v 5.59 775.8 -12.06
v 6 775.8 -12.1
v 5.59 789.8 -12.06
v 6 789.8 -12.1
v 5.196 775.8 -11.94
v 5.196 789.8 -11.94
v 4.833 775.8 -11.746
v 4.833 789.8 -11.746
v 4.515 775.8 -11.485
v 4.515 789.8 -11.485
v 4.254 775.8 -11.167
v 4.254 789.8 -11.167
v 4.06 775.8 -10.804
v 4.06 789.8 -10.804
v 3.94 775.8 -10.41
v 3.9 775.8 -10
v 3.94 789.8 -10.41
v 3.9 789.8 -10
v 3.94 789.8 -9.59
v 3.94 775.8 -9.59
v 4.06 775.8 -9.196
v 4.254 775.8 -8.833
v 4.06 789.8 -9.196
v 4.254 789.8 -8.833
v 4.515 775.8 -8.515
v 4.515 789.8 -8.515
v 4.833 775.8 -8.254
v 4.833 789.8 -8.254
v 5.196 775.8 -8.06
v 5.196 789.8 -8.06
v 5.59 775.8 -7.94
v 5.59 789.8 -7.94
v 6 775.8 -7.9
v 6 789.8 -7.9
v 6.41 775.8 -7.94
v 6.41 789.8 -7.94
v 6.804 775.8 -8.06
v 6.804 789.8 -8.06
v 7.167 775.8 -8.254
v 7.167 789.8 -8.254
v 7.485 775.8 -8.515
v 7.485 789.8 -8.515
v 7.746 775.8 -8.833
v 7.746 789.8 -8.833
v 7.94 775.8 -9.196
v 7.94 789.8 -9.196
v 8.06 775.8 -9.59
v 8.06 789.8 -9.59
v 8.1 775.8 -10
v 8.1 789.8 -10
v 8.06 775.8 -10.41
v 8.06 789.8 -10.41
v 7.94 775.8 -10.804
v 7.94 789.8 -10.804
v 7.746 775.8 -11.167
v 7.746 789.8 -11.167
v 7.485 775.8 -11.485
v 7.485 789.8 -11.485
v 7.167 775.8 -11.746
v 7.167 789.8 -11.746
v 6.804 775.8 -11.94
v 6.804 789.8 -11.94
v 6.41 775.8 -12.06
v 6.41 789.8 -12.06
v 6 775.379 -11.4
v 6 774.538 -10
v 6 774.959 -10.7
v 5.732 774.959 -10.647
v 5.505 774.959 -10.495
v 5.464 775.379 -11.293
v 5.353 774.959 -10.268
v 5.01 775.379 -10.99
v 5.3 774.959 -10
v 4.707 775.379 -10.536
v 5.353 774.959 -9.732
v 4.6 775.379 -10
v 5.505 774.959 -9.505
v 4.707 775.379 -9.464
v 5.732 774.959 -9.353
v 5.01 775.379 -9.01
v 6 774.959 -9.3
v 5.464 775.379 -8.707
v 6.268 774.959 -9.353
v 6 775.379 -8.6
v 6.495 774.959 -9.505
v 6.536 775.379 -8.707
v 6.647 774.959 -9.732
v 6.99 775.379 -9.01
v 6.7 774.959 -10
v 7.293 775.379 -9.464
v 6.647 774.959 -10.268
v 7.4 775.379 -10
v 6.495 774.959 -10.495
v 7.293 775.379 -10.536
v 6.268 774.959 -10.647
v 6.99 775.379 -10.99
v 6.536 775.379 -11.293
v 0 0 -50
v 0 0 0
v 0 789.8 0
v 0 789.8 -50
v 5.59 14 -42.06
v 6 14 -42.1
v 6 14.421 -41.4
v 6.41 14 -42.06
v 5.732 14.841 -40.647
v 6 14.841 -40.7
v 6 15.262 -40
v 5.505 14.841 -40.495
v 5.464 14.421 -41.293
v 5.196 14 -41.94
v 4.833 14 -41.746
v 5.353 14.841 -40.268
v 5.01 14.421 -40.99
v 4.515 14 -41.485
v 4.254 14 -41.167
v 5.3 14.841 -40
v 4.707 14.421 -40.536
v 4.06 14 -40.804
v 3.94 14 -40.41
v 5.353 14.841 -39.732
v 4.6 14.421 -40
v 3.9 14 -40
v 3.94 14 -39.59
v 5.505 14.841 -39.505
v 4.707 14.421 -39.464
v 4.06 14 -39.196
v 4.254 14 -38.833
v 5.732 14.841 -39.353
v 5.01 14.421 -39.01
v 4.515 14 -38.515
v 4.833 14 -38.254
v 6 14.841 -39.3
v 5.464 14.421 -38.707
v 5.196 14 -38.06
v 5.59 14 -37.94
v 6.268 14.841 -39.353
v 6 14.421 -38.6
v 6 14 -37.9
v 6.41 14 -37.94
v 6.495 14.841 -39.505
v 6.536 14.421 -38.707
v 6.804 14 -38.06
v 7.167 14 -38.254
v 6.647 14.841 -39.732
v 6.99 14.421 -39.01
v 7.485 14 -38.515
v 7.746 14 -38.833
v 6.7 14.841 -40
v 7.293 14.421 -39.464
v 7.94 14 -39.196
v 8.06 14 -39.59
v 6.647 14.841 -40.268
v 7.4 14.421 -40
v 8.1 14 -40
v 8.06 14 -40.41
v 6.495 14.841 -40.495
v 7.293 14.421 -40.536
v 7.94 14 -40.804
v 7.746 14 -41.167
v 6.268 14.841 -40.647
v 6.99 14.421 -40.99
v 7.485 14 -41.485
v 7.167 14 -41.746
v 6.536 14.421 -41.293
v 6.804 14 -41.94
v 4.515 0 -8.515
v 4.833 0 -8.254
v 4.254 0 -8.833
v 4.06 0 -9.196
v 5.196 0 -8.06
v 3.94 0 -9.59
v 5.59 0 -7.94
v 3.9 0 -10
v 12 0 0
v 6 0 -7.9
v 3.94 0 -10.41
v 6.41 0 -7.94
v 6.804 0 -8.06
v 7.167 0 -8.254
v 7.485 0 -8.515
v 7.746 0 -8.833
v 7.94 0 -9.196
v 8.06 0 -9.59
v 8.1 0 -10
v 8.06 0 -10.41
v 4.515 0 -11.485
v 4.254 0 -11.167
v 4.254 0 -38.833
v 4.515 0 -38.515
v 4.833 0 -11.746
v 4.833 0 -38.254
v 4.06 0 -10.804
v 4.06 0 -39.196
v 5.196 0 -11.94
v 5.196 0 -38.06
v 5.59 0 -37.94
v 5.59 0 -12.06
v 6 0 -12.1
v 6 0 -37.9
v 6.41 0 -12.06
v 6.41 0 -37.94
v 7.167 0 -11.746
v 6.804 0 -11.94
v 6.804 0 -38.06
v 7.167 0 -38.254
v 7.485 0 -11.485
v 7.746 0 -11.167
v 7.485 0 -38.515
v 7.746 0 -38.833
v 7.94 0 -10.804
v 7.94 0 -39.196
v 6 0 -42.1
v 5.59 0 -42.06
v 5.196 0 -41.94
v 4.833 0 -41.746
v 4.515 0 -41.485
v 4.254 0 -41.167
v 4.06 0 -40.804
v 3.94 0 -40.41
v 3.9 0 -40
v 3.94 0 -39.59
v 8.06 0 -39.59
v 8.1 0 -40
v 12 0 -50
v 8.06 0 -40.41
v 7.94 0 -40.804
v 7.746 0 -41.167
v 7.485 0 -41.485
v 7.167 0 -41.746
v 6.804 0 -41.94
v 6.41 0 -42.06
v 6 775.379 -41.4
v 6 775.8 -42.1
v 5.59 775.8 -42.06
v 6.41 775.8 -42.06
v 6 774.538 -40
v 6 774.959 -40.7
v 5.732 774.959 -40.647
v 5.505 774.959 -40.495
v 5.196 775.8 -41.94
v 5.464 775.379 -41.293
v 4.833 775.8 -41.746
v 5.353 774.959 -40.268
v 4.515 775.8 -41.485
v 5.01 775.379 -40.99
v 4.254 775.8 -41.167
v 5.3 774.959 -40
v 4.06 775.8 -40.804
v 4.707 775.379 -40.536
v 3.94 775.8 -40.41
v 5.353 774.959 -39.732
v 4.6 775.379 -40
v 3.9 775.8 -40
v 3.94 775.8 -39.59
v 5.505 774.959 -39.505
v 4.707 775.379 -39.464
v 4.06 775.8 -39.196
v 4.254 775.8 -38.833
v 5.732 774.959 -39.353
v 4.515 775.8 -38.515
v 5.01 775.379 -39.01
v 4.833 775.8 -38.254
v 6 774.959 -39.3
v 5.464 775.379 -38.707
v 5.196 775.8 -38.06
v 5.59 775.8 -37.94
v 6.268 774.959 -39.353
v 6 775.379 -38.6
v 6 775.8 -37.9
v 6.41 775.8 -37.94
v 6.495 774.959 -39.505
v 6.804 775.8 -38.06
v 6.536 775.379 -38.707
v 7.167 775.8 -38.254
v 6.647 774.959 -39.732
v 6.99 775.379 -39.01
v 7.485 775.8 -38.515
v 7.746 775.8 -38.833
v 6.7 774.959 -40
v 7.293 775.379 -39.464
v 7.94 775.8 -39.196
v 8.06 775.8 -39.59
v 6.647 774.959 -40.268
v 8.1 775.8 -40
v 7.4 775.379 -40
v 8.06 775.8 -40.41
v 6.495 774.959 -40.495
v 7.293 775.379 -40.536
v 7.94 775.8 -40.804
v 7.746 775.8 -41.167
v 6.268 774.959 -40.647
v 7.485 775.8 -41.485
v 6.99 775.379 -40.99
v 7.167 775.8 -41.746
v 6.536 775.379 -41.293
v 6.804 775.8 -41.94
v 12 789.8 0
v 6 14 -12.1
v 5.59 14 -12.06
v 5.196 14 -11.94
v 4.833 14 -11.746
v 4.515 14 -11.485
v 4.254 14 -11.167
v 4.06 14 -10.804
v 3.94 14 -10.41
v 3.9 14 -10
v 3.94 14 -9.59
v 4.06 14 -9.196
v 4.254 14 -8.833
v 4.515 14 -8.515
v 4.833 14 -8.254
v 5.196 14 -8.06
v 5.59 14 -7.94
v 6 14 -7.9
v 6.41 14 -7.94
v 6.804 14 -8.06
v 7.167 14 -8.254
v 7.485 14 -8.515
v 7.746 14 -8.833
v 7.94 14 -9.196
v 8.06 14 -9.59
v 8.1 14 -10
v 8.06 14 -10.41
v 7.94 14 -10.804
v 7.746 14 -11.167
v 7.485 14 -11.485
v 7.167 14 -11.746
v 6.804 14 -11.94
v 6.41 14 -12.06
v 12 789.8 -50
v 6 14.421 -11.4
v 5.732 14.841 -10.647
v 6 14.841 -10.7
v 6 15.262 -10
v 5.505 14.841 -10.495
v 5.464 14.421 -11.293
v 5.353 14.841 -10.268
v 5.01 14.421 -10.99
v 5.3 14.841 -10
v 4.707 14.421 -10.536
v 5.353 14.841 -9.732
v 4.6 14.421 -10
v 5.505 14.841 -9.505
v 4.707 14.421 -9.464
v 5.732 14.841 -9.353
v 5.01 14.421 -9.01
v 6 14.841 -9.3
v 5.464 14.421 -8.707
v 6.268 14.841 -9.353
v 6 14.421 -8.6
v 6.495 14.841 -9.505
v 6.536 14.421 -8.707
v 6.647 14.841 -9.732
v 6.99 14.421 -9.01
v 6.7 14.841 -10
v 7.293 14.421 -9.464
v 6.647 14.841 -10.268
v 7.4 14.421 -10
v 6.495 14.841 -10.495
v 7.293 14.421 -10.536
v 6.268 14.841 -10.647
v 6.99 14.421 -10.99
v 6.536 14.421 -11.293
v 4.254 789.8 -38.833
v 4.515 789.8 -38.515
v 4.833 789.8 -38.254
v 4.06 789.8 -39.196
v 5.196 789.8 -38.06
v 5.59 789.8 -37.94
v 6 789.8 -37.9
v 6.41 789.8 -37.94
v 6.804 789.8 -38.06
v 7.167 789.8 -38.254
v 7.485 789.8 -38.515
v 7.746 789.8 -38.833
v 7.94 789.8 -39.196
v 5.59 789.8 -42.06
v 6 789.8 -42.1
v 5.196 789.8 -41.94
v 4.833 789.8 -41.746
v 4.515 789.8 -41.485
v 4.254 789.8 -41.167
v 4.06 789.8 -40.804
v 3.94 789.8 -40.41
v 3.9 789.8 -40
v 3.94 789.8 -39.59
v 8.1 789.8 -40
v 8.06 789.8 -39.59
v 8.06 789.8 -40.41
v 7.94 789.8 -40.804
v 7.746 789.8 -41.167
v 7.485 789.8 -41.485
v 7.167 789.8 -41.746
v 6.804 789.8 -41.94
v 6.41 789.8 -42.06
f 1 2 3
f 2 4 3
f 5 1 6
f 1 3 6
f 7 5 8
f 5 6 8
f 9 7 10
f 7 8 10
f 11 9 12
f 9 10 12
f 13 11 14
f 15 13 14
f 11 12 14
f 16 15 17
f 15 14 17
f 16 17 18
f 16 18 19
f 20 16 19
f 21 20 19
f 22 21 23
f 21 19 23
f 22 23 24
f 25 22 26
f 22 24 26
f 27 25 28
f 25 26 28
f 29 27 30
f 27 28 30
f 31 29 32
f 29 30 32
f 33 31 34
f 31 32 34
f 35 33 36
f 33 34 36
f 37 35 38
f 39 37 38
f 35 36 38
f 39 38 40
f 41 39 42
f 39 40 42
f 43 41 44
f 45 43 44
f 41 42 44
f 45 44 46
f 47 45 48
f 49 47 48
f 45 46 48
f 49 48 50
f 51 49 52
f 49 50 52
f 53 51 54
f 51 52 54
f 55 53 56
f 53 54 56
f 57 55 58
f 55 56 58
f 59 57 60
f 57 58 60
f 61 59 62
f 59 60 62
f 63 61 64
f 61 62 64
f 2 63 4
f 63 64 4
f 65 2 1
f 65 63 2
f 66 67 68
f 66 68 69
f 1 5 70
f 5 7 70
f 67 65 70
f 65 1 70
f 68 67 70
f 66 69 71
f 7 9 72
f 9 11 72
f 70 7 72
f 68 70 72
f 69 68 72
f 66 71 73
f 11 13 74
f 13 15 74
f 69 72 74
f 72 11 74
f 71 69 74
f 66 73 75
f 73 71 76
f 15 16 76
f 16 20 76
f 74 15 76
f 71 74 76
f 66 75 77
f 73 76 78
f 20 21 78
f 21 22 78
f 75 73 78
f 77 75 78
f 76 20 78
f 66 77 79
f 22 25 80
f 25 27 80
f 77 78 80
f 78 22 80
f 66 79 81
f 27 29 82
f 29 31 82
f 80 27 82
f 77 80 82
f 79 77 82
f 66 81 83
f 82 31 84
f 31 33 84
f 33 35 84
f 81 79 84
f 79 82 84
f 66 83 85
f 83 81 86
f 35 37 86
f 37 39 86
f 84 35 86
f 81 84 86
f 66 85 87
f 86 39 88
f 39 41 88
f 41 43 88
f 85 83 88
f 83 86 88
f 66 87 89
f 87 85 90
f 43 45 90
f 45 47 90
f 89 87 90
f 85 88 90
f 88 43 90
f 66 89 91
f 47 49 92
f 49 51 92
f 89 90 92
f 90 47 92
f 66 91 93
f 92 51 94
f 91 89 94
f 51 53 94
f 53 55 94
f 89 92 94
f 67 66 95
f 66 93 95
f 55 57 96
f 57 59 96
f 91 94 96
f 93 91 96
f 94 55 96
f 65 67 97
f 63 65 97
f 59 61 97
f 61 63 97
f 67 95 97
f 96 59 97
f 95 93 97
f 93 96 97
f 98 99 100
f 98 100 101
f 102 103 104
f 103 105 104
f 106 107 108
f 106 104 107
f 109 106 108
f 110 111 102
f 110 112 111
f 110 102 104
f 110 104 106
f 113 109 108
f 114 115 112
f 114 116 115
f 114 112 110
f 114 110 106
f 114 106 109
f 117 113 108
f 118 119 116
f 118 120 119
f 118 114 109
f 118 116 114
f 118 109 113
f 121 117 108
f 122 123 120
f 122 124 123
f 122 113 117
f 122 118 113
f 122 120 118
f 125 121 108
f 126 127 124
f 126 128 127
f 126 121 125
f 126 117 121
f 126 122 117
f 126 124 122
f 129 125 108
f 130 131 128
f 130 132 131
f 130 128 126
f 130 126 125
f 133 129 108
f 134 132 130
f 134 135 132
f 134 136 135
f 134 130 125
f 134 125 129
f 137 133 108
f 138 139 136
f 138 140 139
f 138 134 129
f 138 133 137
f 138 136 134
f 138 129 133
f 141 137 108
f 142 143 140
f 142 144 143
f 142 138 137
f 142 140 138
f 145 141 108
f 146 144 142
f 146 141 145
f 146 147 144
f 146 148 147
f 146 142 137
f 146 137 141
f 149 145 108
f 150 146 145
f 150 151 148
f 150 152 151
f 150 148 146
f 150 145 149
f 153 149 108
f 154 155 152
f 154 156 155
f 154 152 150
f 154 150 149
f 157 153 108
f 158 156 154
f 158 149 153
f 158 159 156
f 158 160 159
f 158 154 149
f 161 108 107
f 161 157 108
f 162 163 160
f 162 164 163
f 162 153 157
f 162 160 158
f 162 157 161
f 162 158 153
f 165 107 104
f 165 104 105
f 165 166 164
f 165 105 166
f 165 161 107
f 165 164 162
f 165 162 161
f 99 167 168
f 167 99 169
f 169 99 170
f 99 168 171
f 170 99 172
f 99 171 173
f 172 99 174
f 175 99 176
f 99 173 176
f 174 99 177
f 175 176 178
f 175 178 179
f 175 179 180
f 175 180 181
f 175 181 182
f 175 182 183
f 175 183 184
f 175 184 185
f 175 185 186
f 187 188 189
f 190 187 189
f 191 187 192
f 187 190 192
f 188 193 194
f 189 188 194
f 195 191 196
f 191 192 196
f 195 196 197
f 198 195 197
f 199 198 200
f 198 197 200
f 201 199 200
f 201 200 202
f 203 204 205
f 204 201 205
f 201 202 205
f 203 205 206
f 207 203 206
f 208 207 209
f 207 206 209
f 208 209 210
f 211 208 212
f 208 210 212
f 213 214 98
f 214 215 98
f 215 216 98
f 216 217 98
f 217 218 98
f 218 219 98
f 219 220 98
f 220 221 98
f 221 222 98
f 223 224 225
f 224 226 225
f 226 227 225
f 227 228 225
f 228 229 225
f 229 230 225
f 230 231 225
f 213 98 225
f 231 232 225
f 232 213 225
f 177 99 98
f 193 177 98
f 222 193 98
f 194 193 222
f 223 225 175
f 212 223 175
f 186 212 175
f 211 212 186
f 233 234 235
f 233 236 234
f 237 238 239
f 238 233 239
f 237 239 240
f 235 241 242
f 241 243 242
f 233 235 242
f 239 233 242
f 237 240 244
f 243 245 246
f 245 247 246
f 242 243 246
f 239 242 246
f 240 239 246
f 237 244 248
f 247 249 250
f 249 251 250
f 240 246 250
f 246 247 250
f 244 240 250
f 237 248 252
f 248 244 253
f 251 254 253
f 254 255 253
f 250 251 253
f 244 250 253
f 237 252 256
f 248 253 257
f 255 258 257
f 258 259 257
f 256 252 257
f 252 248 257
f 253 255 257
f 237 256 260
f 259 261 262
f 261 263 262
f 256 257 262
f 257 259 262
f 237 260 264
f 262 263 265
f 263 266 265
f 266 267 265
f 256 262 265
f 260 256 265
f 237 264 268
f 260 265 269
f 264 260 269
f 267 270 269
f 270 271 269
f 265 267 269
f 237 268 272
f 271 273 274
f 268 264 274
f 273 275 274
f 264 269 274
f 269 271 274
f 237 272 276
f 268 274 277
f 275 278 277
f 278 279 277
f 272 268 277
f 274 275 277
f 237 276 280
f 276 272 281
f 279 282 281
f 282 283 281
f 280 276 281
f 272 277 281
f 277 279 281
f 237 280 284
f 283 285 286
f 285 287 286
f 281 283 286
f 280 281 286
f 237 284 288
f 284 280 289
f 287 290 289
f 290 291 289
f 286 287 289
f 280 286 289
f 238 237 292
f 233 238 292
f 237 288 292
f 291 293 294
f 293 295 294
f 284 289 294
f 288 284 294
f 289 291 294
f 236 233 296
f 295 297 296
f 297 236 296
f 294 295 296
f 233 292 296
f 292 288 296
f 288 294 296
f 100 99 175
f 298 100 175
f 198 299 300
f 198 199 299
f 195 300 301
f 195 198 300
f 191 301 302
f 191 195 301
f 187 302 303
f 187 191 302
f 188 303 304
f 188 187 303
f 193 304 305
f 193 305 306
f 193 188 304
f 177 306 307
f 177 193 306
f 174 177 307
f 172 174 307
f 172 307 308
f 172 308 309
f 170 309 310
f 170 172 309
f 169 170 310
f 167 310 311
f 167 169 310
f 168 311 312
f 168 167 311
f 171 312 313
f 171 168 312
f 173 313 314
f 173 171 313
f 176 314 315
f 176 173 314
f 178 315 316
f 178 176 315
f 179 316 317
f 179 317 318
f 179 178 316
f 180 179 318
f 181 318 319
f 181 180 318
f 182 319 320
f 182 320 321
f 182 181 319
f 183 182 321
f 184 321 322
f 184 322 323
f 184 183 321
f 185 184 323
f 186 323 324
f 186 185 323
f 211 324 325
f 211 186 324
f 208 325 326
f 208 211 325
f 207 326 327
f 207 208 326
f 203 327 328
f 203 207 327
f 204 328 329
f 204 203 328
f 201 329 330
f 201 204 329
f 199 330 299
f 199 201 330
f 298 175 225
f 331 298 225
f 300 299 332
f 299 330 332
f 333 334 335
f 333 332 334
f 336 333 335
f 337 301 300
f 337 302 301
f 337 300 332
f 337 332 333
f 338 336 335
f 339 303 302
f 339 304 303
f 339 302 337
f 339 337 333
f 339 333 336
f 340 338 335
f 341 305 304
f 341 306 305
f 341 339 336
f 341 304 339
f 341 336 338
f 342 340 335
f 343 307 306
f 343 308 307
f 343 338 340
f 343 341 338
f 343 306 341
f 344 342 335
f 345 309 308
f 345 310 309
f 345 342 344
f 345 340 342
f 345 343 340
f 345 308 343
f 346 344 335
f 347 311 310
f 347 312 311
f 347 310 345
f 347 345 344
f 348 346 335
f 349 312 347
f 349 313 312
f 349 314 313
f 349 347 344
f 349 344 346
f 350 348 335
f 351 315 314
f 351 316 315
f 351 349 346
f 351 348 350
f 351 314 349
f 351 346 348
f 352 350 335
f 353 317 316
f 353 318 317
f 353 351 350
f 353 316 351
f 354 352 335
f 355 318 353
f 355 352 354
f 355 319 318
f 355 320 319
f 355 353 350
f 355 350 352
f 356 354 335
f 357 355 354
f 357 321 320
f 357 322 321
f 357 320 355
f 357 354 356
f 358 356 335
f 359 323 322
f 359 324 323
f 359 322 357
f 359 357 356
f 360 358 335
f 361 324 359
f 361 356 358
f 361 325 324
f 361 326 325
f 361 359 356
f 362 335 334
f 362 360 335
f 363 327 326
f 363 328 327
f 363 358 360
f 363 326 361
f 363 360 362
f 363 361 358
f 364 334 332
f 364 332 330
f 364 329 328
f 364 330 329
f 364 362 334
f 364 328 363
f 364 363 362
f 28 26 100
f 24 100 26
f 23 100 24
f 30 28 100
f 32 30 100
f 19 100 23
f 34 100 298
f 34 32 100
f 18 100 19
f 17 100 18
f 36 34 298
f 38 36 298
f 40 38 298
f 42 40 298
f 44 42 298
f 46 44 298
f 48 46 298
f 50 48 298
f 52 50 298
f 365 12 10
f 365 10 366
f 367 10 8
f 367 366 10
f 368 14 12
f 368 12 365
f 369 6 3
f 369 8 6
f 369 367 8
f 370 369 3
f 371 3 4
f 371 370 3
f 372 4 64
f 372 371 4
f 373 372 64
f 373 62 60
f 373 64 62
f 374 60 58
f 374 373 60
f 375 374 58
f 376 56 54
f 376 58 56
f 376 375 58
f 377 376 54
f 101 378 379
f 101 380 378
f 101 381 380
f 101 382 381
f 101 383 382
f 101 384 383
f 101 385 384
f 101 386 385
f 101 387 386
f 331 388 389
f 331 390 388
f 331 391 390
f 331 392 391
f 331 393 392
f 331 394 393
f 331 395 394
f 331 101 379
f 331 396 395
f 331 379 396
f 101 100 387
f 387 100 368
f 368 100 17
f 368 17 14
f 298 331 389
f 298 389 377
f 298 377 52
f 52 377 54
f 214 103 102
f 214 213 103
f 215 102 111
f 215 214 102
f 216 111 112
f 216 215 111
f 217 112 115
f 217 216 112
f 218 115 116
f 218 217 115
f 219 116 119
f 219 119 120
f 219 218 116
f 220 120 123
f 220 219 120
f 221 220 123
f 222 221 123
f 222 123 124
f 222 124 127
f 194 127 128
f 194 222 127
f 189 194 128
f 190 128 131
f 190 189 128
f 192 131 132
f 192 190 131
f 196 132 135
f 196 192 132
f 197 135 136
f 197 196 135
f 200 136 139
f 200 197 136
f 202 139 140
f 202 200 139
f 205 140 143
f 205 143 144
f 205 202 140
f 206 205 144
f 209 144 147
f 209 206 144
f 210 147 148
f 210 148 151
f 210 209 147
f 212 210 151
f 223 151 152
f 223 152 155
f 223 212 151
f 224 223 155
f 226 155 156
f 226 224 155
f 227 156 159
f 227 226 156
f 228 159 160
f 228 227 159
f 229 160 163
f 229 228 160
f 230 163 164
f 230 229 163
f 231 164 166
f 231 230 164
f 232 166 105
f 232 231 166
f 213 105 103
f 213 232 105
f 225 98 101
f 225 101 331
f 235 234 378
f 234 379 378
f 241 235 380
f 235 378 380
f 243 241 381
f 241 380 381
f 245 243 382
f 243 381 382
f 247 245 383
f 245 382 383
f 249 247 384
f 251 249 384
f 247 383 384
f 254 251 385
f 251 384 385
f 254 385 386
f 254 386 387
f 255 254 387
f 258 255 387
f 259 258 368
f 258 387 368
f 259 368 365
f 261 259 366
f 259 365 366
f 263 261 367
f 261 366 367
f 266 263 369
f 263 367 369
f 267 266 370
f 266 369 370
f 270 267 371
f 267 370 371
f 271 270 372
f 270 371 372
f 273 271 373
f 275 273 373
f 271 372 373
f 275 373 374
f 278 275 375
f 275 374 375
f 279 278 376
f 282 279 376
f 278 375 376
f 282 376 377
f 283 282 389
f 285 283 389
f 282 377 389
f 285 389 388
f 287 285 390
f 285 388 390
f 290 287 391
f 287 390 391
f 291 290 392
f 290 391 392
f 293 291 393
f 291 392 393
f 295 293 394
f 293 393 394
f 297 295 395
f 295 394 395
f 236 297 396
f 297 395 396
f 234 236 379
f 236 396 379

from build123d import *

# Parameters (mm, degrees)
SKETCH1_W                             = 12
SKETCH1_H                             = 50
BASE_DEPTH                            = 789.8
END_BOLT_HOLES_FOR_INSERTS_AT_2_COUNT = 2
END_BOLT_HOLES_FOR_INSERTS_AT_2_PITCH = 30


with BuildPart() as part:
    # Sketch1 → base (new body)
    with BuildSketch(Plane(origin=(0, 0, 0), x_dir=(1, 0, 0), z_dir=(0, 1, 0))):
        with Locations((6, 25)):
            Rectangle(SKETCH1_W, SKETCH1_H)
    extrude(amount=BASE_DEPTH)

    # Sketch3 → end bolt holes for inserts (revolve, cut)
    with BuildSketch(Plane(origin=(6, 0, -40), x_dir=(0, 0, -1), z_dir=(1, 0, 0))):
        Polygon((0, 0), (0, 15.2618073), (2.1, 14), (2.1, 0), align=None)
    end_bolt_holes_for_inserts = revolve(axis=Axis((6, -6.35, -40), (0, 1, 0)), mode=Mode.SUBTRACT)

    # end bolt holes for inserts at 2: end bolt holes for inserts ×2
    with Locations(*[(0, 0, i * END_BOLT_HOLES_FOR_INSERTS_AT_2_PITCH) for i in range(1, END_BOLT_HOLES_FOR_INSERTS_AT_2_COUNT)]):
        add(end_bolt_holes_for_inserts, mode=Mode.SUBTRACT)

    # mirror end bolt holes: end bolt holes for inserts across plane
    add(end_bolt_holes_for_inserts.mirror(Plane(origin=(0, 394.9, 0), x_dir=(0, 0, 1), z_dir=(0, -1, 0))), mode=Mode.SUBTRACT)

    # mirror end bolt holes copy 1 sketch → mirror end bolt holes copy 1 (revolve, cut)
    with BuildSketch(Plane(origin=(6, 789.8, -10), x_dir=(0, 0, -1), z_dir=(1, 0, 0))):
        Polygon((0, 0), (0, -15.2618073), (2.1, -14), (2.1, 0), align=None)
    revolve(axis=Axis((6, 796.15, -10), (0, 1, 0)), mode=Mode.SUBTRACT)


solid = part.part
